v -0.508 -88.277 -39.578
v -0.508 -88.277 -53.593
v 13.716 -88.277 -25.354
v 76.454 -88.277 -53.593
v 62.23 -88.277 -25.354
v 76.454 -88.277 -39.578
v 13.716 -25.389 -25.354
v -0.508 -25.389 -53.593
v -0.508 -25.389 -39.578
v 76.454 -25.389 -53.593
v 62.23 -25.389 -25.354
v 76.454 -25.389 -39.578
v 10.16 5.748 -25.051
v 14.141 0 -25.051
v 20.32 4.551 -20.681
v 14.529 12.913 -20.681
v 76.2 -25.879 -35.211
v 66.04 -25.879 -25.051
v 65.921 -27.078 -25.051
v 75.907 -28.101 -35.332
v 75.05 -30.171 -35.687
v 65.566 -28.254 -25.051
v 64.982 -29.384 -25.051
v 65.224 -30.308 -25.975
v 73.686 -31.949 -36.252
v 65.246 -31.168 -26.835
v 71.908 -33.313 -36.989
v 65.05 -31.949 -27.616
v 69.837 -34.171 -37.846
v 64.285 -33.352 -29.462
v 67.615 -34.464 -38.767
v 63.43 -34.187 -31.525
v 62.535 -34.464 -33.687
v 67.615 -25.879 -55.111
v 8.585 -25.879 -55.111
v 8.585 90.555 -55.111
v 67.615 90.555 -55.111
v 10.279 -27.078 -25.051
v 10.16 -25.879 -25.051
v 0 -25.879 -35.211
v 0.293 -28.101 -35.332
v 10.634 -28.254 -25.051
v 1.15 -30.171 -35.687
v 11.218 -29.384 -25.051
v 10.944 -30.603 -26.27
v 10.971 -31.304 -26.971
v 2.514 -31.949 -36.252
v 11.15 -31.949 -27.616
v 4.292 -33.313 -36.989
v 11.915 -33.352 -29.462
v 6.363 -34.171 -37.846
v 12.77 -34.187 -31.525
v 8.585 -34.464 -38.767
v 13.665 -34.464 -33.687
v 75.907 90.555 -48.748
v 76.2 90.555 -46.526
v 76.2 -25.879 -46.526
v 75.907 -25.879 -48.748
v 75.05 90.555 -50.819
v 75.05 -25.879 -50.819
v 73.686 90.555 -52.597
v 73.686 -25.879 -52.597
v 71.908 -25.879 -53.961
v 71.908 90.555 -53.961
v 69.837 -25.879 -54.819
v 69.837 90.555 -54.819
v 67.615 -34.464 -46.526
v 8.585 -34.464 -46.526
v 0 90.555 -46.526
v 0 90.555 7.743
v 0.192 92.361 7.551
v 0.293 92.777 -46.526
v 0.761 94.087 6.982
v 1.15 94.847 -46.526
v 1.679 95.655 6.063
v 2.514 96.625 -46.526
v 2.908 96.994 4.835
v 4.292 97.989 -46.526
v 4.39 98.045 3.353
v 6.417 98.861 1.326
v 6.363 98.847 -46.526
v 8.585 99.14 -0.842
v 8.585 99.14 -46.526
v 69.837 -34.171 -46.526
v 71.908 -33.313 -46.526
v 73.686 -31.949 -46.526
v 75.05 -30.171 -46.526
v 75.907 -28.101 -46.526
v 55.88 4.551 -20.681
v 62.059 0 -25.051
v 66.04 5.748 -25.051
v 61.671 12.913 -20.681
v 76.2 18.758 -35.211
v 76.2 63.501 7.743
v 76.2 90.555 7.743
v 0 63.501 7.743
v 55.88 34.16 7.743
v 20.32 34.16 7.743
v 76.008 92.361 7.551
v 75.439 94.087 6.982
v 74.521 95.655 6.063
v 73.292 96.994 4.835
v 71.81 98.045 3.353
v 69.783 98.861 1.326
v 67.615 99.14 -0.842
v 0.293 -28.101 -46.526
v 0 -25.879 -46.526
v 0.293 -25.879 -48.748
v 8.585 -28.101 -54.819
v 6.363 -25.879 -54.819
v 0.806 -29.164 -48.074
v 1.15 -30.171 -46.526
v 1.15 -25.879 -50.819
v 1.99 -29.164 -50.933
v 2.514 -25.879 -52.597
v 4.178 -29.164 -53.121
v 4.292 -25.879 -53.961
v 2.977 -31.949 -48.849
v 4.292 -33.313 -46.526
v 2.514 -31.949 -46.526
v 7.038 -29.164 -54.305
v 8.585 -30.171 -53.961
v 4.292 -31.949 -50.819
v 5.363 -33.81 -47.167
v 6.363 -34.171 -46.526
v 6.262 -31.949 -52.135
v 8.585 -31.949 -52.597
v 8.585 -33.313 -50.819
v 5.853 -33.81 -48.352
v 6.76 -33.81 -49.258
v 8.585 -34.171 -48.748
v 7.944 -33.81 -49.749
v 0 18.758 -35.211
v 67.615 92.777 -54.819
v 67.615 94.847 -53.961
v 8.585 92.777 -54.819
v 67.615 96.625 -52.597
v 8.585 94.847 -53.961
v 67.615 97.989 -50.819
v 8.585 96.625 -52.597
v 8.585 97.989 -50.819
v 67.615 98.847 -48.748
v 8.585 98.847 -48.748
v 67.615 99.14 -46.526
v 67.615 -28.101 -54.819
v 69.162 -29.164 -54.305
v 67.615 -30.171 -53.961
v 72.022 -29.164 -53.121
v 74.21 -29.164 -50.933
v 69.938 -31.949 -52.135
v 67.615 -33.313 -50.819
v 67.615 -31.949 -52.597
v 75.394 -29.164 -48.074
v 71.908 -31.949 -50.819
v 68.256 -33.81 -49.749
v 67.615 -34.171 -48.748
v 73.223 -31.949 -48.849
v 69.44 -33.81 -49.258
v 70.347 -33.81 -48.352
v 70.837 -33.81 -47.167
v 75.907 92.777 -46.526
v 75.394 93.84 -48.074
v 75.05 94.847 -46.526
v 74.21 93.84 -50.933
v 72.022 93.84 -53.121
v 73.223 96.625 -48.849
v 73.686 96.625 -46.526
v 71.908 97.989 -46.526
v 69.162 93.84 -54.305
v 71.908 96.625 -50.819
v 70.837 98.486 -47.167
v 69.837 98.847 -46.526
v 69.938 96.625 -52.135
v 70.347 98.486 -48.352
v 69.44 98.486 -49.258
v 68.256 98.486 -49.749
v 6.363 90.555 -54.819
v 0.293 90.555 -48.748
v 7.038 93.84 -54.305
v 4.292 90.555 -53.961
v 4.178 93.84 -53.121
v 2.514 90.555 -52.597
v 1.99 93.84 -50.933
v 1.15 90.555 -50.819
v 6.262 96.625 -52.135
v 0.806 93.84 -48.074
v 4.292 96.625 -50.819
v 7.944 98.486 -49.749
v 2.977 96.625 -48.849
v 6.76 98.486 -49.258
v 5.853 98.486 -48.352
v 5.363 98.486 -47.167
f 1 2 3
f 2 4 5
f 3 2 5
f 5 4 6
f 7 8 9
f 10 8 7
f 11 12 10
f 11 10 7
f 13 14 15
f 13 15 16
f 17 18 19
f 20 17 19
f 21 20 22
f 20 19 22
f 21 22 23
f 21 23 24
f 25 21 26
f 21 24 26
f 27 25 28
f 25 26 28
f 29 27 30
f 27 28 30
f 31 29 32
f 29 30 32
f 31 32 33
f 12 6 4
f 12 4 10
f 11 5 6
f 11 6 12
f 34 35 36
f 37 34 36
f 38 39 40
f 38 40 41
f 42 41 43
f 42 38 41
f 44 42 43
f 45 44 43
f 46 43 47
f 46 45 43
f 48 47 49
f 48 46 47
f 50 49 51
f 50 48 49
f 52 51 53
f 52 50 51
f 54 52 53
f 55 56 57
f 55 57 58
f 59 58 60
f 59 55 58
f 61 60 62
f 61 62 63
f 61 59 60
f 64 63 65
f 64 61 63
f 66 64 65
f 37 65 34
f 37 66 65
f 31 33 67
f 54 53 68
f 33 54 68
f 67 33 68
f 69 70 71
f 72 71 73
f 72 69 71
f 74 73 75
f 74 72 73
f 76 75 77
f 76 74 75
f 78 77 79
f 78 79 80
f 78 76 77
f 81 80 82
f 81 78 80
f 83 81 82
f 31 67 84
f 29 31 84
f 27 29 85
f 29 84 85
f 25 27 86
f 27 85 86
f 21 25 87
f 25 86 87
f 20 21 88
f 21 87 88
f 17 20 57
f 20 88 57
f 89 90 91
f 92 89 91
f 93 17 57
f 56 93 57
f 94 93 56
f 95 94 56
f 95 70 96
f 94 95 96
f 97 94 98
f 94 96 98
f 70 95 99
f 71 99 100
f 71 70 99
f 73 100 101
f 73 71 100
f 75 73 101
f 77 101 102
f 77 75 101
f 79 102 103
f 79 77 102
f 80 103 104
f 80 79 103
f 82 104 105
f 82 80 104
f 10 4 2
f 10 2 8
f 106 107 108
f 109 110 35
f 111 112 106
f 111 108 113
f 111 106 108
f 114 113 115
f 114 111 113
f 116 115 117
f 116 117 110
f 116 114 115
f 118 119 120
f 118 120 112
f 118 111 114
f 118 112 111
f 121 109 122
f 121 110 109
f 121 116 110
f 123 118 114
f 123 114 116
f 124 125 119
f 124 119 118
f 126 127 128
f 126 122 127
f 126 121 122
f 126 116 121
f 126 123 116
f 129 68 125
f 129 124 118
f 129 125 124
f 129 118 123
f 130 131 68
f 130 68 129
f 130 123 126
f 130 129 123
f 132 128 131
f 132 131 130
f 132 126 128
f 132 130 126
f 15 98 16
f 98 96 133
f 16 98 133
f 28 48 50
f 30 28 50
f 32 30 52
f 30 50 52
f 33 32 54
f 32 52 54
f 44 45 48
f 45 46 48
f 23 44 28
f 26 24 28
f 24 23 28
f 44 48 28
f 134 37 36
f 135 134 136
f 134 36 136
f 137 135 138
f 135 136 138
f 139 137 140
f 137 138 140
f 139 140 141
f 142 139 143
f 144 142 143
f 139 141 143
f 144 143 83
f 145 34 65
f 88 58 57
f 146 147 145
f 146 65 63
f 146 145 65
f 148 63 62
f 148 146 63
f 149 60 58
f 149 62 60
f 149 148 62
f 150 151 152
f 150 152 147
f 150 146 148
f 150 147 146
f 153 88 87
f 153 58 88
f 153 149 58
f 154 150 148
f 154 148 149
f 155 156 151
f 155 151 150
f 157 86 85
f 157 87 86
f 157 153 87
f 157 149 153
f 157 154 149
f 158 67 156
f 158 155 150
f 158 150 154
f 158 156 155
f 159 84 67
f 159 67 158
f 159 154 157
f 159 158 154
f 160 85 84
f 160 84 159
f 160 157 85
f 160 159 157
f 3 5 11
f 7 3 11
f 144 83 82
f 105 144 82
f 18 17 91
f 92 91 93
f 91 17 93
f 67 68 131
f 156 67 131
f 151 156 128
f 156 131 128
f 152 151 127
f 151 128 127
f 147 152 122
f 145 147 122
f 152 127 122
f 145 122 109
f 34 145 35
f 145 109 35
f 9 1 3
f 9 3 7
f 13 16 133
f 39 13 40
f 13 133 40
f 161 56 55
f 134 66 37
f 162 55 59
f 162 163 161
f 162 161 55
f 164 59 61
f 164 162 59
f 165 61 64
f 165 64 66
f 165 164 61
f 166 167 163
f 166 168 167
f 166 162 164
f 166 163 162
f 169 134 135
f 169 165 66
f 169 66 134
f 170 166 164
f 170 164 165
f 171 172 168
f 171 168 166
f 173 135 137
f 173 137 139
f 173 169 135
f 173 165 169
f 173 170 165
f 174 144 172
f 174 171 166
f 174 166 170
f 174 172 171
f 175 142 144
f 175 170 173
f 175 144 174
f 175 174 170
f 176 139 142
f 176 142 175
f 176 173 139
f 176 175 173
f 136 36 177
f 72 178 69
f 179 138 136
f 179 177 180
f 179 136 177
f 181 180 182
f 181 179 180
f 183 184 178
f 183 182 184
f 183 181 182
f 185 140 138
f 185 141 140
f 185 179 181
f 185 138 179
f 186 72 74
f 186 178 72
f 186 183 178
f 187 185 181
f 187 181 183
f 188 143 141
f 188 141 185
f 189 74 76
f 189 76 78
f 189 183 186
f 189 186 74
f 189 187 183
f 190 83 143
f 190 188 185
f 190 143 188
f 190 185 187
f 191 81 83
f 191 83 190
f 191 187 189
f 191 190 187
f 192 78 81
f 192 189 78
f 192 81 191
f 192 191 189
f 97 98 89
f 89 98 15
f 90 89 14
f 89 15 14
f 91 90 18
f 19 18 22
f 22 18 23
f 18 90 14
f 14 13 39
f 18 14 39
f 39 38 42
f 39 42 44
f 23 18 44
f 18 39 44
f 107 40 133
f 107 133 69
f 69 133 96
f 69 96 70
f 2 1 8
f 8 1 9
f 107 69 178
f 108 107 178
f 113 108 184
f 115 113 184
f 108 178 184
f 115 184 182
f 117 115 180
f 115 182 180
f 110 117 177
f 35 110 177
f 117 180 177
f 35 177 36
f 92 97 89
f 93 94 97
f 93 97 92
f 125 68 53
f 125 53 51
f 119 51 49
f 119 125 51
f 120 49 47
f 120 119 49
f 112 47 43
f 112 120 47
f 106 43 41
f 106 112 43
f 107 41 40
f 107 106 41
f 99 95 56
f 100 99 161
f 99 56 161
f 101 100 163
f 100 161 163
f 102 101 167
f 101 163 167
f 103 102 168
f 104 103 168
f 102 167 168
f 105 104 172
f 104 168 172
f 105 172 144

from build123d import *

# Parameters (mm, degrees)
F1_DEPTH      = 76.2
F2_SIZE       = 20.32
F3_SIZE       = 10.16
F4_SIZE       = 5.08
F5_SIZE       = 5.08
F6_SIZE       = 5.08
F7_T1_DEPTH   = 50.1089220358
F7_T3_DEPTH   = 83.82
F7_T5_DEPTH   = 32.7781013128
F7_T7_DEPTH   = 50.1089220358
F7_T9_DEPTH   = 59.0301131444
F7_T11_DEPTH  = 116.4331532733
F7_T13_DEPTH  = 119.124717139
F7_T15_DEPTH  = 75.7315738338
F7_S19_W      = 8.5849434278
F7_S19_H      = 8.5849434278
F7_T20_DEPTH  = 8.5849434278
F7_S25_W      = 8.5849434278
F7_S25_H      = 8.5849434278
F7_T26_DEPTH  = 8.5849434278
F7_S31_W      = 8.5849434278
F7_S31_H      = 8.5849434278
F7_T32_DEPTH  = 8.5849434278
F7_S37_W      = 8.5849434278
F7_S37_H      = 8.5849434278
F7_T38_DEPTH  = 8.5849434278
F8_W          = 62.888501212
F8_H          = 28.2388273627
F9_DEPTH      = 76.454
F9_DEPTH_BACK = 0.508
F10_SIZE      = 14.224


# Not quite as in the source:
# - a fillet or chamfer that OpenCascade refuses, or shapes differently, is made with other operations: its cross-section is extruded or revolved along the edge and cut away or added


with BuildPart() as f1:
    # F0 (on Right) → F1 (new body)
    with BuildSketch(Plane.YZ):
        Polygon((0, -25.0505693257), (-34.4635136425, -25.0505693257), (-34.4635136425, -55.1112554967), (99.1395264864, -55.1112554967), (99.1395264864, 7.7429031953), (34.1598689556, 7.7429031953), align=None)
    extrude(amount=F1_DEPTH)

    # F2
    f2_edges = [f1.edges().sort_by_distance(p)[0] for p in [
        (76.2, 17.079934, -8.653833),
        (0, 17.079934, -8.653833),
    ]]
    chamfer(f2_edges, length=F2_SIZE)

    # F3
    f3_edges = [f1.edges().sort_by_distance(p)[0] for p in [
        (76.2, -17.231757, -25.050569),
        (0, -17.231757, -25.050569),
    ]]
    chamfer(f3_edges, length=F3_SIZE)

    # F4
    f4_edges = [f1.edges().sort_by_distance(p)[0] for p in [
        (60.96, 7.335403, -25.050569),
    ]]
    chamfer(f4_edges, length=F4_SIZE)

    # F5
    f5_edges = [f1.edges().sort_by_distance(p)[0] for p in [
        (15.24, 7.335403, -25.050569),
    ]]
    chamfer(f5_edges, length=F5_SIZE)

    # F6
    f6_edges = [f1.edges().sort_by_distance(p)[0] for p in [
        (38.1, -34.463514, -25.050569),
    ]]
    chamfer(f6_edges, length=F6_SIZE)

    # F7: fillet of radius 8.5849434278 on 12 edges, made by hand

    # F7_s2 → F7_t1 (cut)
    with BuildSketch(Plane(origin=(2.6508946219, 0, 2.6508946219), x_dir=(0, 1, 0), z_dir=(-0.7071067812, 0, -0.7071067812))):
        with BuildLine():
            ThreePointArc((-25.8785702148, 24.8976323396), (-31.9490419287, 27.4121040535), (-34.4635136425, 33.4825757674))
            Line((-34.4635136425, 33.4825757674), (-34.4635136425, 24.8976323396))
            Line((-34.4635136425, 24.8976323396), (-25.8785702148, 24.8976323396))
        make_face()
    extrude(amount=F7_T1_DEPTH, mode=Mode.SUBTRACT)

    # F7_s4 → F7_t3 (cut)
    with BuildSketch(Plane.YZ.offset(-3.81)):
        with BuildLine():
            ThreePointArc((-31.9490419287, -27.6160976118), (-33.8100237355, -30.4012537081), (-34.4635136425, -33.6865693257))
            Line((-34.4635136425, -33.6865693257), (-34.4635136425, -30.1305693257))
            Line((-34.4635136425, -30.1305693257), (-31.9490419287, -27.6160976118))
        make_face()
    extrude(amount=F7_T3_DEPTH, mode=Mode.SUBTRACT)

    # F7_s6 → F7_t5 (cut)
    with BuildSketch(Plane.XY.offset(-46.5263120689)):
        with BuildLine():
            ThreePointArc((8.5849434278, -34.4635136425), (2.5144717139, -31.9490419287), (0, -25.8785702148))
            Line((0, -25.8785702148), (0, -34.4635136425))
            Line((0, -34.4635136425), (8.5849434278, -34.4635136425))
        make_face()
        with BuildLine():
            ThreePointArc((67.6150565722, -34.4635136425), (73.6855282861, -31.9490419287), (76.2, -25.8785702148))
            Line((76.2, -25.8785702148), (76.2, -34.4635136425))
            Line((76.2, -34.4635136425), (67.6150565722, -34.4635136425))
        make_face()
    extrude(amount=F7_T5_DEPTH, mode=Mode.SUBTRACT)

    # F7_s8 → F7_t7 (cut)
    with BuildSketch(Plane(origin=(35.4491053781, 0, -35.4491053781), x_dir=(0, 1, 0), z_dir=(0.7071067812, 0, -0.7071067812))):
        with BuildLine():
            ThreePointArc((-25.8785702148, 28.9839043868), (-31.9490419287, 26.4694326729), (-34.4635136425, 20.398960959))
            Line((-34.4635136425, 20.398960959), (-34.4635136425, 28.9839043868))
            Line((-34.4635136425, 28.9839043868), (-25.8785702148, 28.9839043868))
        make_face()
    extrude(amount=F7_T7_DEPTH, mode=Mode.SUBTRACT)

    # F7_s10 → F7_t9 (cut)
    with BuildSketch(Plane.YZ.offset(8.5849434278)):
        with BuildLine():
            ThreePointArc((-34.4635136425, -46.5263120689), (-31.9490419287, -52.5967837828), (-25.8785702148, -55.1112554967))
            Line((-25.8785702148, -55.1112554967), (-34.4635136425, -55.1112554967))
            Line((-34.4635136425, -55.1112554967), (-34.4635136425, -46.5263120689))
        make_face()
        with BuildLine():
            ThreePointArc((90.5545830586, -55.1112554967), (96.6250547725, -52.5967837828), (99.1395264864, -46.5263120689))
            Line((99.1395264864, -46.5263120689), (99.1395264864, -55.1112554967))
            Line((99.1395264864, -55.1112554967), (90.5545830586, -55.1112554967))
        make_face()
    extrude(amount=F7_T9_DEPTH, mode=Mode.SUBTRACT)

    # F7_s12 → F7_t11 (cut)
    with BuildSketch(Plane.XZ.offset(-90.5545830586)):
        with BuildLine():
            ThreePointArc((0, -46.5263120689), (2.5144717139, -52.5967837828), (8.5849434278, -55.1112554967))
            Line((8.5849434278, -55.1112554967), (0, -55.1112554967))
            Line((0, -55.1112554967), (0, -46.5263120689))
        make_face()
        with BuildLine():
            ThreePointArc((76.2, -46.5263120689), (73.6855282861, -52.5967837828), (67.6150565722, -55.1112554967))
            Line((67.6150565722, -55.1112554967), (76.2, -55.1112554967))
            Line((76.2, -55.1112554967), (76.2, -46.5263120689))
        make_face()
    extrude(amount=F7_T11_DEPTH, mode=Mode.SUBTRACT)

    # F7_s14 → F7_t13 (cut)
    with BuildSketch(Plane.YZ.offset(-21.4623585695)):
        with BuildLine():
            ThreePointArc((90.5545830586, 7.7429031953), (96.6250547725, 5.2284314814), (99.1395264864, -0.8420402325))
            Line((99.1395264864, -0.8420402325), (99.1395264864, 7.7429031953))
            Line((99.1395264864, 7.7429031953), (90.5545830586, 7.7429031953))
        make_face()
    extrude(amount=F7_T13_DEPTH, mode=Mode.SUBTRACT)

    # F7_s16 → F7_t15 (cut)
    with BuildSketch(Plane.XY.offset(-46.5263120689)):
        with BuildLine():
            ThreePointArc((0, 90.5545830586), (2.5144717139, 96.6250547725), (8.5849434278, 99.1395264864))
            Line((8.5849434278, 99.1395264864), (0, 99.1395264864))
            Line((0, 99.1395264864), (0, 90.5545830586))
        make_face()
        with BuildLine():
            ThreePointArc((76.2, 90.5545830586), (73.6855282861, 96.6250547725), (67.6150565722, 99.1395264864))
            Line((67.6150565722, 99.1395264864), (76.2, 99.1395264864))
            Line((76.2, 99.1395264864), (76.2, 90.5545830586))
        make_face()
    extrude(amount=F7_T15_DEPTH, mode=Mode.SUBTRACT)


with BuildPart() as f7_tool18:
    # F7_s19 → F7_t20 (new body)
    with BuildSketch(Plane.XZ.offset(25.8785702148)):
        with Locations((4.2924717139, -50.8187837828)):
            Rectangle(F7_S19_W, F7_S19_H)
    extrude(amount=F7_T20_DEPTH)

    # F7_s21 → F7_t22 (revolve, cut)
    with BuildSketch(Plane(origin=(8.5849434278, -25.8785702148, -46.5263120689), x_dir=(0.7071067812, 0, 0.7071067812), z_dir=(0.7071067812, 0, -0.7071067812))):
        with BuildLine():
            ThreePointArc((0, -8.5849434278), (8.5849434278, 0), (0, 8.5849434278))
            Line((0, 8.5849434278), (0, -8.5849434278))
        make_face()
    revolve(axis=Axis((8.5849434278, -25.8785702148, -46.5263120689), (0, -1, 0)), mode=Mode.SUBTRACT)


with BuildPart() as f1_1:
    add(f1.part)

    # F7_t17: cut F7_tool18
    add(f7_tool18.part, mode=Mode.SUBTRACT)


with BuildPart() as f7_tool24:
    # F7_s25 → F7_t26 (new body)
    with BuildSketch(Plane.XZ.offset(25.8785702148)):
        with Locations((71.9075282861, -50.8187837828)):
            Rectangle(F7_S25_W, F7_S25_H)
    extrude(amount=F7_T26_DEPTH)

    # F7_s27 → F7_t28 (revolve, cut)
    with BuildSketch(Plane(origin=(67.6150565722, -25.8785702148, -46.5263120689), x_dir=(-0.7071067812, 0, 0.7071067812), z_dir=(0.7071067812, 0, 0.7071067812))):
        with BuildLine():
            ThreePointArc((0, -8.5849434278), (8.5849434278, 0), (0, 8.5849434278))
            Line((0, 8.5849434278), (0, -8.5849434278))
        make_face()
    revolve(axis=Axis((67.6150565722, -25.8785702148, -46.5263120689), (0, -1, 0)), mode=Mode.SUBTRACT)


with BuildPart() as f1_2:
    add(f1_1.part)

    # F7_t23: cut F7_tool24
    add(f7_tool24.part, mode=Mode.SUBTRACT)


with BuildPart() as f7_tool30:
    # F7_s31 → F7_t32 (new body)
    with BuildSketch(Plane.XZ.offset(-90.5545830586)):
        with Locations((4.2924717139, -50.8187837828)):
            Rectangle(F7_S31_W, F7_S31_H)
    extrude(amount=-F7_T32_DEPTH)

    # F7_s33 → F7_t34 (revolve, cut)
    with BuildSketch(Plane(origin=(8.5849434278, 90.5545830586, -46.5263120689), x_dir=(0.7071067812, 0, 0.7071067812), z_dir=(-0.7071067812, 0, 0.7071067812))):
        with BuildLine():
            ThreePointArc((0, -8.5849434278), (8.5849434278, 0), (0, 8.5849434278))
            Line((0, 8.5849434278), (0, -8.5849434278))
        make_face()
    revolve(axis=Axis((8.5849434278, 90.5545830586, -46.5263120689), (0, 1, 0)), mode=Mode.SUBTRACT)


with BuildPart() as f1_3:
    add(f1_2.part)

    # F7_t29: cut F7_tool30
    add(f7_tool30.part, mode=Mode.SUBTRACT)


with BuildPart() as f7_tool36:
    # F7_s37 → F7_t38 (new body)
    with BuildSketch(Plane.XZ.offset(-90.5545830586)):
        with Locations((71.9075282861, -50.8187837828)):
            Rectangle(F7_S37_W, F7_S37_H)
    extrude(amount=-F7_T38_DEPTH)

    # F7_s39 → F7_t40 (revolve, cut)
    with BuildSketch(Plane(origin=(67.6150565722, 90.5545830586, -46.5263120689), x_dir=(-0.7071067812, 0, 0.7071067812), z_dir=(-0.7071067812, 0, -0.7071067812))):
        with BuildLine():
            ThreePointArc((0, -8.5849434278), (8.5849434278, 0), (0, 8.5849434278))
            Line((0, 8.5849434278), (0, -8.5849434278))
        make_face()
    revolve(axis=Axis((67.6150565722, 90.5545830586, -46.5263120689), (0, 1, 0)), mode=Mode.SUBTRACT)


with BuildPart() as f1_4:
    add(f1_3.part)

    # F7_t35: cut F7_tool36
    add(f7_tool36.part, mode=Mode.SUBTRACT)


with BuildPart() as f9:
    # F8 (on Right) → F9 (new body, two sides)
    with BuildSketch(Plane.YZ) as f9_sk:
        with Locations((-56.8328062072, -39.4736258313)):
            Rectangle(F8_W, F8_H)
    extrude(amount=F9_DEPTH)
    extrude(f9_sk.sketch, amount=-F9_DEPTH_BACK)

    # F10
    f10_edges = [f9.edges().sort_by_distance(p)[0] for p in [
        (76.454, -56.832806, -25.354212),
        (-0.508, -56.832806, -25.354212),
    ]]
    chamfer(f10_edges, length=F10_SIZE)


solid = Compound([f1_4.part, f9.part])
